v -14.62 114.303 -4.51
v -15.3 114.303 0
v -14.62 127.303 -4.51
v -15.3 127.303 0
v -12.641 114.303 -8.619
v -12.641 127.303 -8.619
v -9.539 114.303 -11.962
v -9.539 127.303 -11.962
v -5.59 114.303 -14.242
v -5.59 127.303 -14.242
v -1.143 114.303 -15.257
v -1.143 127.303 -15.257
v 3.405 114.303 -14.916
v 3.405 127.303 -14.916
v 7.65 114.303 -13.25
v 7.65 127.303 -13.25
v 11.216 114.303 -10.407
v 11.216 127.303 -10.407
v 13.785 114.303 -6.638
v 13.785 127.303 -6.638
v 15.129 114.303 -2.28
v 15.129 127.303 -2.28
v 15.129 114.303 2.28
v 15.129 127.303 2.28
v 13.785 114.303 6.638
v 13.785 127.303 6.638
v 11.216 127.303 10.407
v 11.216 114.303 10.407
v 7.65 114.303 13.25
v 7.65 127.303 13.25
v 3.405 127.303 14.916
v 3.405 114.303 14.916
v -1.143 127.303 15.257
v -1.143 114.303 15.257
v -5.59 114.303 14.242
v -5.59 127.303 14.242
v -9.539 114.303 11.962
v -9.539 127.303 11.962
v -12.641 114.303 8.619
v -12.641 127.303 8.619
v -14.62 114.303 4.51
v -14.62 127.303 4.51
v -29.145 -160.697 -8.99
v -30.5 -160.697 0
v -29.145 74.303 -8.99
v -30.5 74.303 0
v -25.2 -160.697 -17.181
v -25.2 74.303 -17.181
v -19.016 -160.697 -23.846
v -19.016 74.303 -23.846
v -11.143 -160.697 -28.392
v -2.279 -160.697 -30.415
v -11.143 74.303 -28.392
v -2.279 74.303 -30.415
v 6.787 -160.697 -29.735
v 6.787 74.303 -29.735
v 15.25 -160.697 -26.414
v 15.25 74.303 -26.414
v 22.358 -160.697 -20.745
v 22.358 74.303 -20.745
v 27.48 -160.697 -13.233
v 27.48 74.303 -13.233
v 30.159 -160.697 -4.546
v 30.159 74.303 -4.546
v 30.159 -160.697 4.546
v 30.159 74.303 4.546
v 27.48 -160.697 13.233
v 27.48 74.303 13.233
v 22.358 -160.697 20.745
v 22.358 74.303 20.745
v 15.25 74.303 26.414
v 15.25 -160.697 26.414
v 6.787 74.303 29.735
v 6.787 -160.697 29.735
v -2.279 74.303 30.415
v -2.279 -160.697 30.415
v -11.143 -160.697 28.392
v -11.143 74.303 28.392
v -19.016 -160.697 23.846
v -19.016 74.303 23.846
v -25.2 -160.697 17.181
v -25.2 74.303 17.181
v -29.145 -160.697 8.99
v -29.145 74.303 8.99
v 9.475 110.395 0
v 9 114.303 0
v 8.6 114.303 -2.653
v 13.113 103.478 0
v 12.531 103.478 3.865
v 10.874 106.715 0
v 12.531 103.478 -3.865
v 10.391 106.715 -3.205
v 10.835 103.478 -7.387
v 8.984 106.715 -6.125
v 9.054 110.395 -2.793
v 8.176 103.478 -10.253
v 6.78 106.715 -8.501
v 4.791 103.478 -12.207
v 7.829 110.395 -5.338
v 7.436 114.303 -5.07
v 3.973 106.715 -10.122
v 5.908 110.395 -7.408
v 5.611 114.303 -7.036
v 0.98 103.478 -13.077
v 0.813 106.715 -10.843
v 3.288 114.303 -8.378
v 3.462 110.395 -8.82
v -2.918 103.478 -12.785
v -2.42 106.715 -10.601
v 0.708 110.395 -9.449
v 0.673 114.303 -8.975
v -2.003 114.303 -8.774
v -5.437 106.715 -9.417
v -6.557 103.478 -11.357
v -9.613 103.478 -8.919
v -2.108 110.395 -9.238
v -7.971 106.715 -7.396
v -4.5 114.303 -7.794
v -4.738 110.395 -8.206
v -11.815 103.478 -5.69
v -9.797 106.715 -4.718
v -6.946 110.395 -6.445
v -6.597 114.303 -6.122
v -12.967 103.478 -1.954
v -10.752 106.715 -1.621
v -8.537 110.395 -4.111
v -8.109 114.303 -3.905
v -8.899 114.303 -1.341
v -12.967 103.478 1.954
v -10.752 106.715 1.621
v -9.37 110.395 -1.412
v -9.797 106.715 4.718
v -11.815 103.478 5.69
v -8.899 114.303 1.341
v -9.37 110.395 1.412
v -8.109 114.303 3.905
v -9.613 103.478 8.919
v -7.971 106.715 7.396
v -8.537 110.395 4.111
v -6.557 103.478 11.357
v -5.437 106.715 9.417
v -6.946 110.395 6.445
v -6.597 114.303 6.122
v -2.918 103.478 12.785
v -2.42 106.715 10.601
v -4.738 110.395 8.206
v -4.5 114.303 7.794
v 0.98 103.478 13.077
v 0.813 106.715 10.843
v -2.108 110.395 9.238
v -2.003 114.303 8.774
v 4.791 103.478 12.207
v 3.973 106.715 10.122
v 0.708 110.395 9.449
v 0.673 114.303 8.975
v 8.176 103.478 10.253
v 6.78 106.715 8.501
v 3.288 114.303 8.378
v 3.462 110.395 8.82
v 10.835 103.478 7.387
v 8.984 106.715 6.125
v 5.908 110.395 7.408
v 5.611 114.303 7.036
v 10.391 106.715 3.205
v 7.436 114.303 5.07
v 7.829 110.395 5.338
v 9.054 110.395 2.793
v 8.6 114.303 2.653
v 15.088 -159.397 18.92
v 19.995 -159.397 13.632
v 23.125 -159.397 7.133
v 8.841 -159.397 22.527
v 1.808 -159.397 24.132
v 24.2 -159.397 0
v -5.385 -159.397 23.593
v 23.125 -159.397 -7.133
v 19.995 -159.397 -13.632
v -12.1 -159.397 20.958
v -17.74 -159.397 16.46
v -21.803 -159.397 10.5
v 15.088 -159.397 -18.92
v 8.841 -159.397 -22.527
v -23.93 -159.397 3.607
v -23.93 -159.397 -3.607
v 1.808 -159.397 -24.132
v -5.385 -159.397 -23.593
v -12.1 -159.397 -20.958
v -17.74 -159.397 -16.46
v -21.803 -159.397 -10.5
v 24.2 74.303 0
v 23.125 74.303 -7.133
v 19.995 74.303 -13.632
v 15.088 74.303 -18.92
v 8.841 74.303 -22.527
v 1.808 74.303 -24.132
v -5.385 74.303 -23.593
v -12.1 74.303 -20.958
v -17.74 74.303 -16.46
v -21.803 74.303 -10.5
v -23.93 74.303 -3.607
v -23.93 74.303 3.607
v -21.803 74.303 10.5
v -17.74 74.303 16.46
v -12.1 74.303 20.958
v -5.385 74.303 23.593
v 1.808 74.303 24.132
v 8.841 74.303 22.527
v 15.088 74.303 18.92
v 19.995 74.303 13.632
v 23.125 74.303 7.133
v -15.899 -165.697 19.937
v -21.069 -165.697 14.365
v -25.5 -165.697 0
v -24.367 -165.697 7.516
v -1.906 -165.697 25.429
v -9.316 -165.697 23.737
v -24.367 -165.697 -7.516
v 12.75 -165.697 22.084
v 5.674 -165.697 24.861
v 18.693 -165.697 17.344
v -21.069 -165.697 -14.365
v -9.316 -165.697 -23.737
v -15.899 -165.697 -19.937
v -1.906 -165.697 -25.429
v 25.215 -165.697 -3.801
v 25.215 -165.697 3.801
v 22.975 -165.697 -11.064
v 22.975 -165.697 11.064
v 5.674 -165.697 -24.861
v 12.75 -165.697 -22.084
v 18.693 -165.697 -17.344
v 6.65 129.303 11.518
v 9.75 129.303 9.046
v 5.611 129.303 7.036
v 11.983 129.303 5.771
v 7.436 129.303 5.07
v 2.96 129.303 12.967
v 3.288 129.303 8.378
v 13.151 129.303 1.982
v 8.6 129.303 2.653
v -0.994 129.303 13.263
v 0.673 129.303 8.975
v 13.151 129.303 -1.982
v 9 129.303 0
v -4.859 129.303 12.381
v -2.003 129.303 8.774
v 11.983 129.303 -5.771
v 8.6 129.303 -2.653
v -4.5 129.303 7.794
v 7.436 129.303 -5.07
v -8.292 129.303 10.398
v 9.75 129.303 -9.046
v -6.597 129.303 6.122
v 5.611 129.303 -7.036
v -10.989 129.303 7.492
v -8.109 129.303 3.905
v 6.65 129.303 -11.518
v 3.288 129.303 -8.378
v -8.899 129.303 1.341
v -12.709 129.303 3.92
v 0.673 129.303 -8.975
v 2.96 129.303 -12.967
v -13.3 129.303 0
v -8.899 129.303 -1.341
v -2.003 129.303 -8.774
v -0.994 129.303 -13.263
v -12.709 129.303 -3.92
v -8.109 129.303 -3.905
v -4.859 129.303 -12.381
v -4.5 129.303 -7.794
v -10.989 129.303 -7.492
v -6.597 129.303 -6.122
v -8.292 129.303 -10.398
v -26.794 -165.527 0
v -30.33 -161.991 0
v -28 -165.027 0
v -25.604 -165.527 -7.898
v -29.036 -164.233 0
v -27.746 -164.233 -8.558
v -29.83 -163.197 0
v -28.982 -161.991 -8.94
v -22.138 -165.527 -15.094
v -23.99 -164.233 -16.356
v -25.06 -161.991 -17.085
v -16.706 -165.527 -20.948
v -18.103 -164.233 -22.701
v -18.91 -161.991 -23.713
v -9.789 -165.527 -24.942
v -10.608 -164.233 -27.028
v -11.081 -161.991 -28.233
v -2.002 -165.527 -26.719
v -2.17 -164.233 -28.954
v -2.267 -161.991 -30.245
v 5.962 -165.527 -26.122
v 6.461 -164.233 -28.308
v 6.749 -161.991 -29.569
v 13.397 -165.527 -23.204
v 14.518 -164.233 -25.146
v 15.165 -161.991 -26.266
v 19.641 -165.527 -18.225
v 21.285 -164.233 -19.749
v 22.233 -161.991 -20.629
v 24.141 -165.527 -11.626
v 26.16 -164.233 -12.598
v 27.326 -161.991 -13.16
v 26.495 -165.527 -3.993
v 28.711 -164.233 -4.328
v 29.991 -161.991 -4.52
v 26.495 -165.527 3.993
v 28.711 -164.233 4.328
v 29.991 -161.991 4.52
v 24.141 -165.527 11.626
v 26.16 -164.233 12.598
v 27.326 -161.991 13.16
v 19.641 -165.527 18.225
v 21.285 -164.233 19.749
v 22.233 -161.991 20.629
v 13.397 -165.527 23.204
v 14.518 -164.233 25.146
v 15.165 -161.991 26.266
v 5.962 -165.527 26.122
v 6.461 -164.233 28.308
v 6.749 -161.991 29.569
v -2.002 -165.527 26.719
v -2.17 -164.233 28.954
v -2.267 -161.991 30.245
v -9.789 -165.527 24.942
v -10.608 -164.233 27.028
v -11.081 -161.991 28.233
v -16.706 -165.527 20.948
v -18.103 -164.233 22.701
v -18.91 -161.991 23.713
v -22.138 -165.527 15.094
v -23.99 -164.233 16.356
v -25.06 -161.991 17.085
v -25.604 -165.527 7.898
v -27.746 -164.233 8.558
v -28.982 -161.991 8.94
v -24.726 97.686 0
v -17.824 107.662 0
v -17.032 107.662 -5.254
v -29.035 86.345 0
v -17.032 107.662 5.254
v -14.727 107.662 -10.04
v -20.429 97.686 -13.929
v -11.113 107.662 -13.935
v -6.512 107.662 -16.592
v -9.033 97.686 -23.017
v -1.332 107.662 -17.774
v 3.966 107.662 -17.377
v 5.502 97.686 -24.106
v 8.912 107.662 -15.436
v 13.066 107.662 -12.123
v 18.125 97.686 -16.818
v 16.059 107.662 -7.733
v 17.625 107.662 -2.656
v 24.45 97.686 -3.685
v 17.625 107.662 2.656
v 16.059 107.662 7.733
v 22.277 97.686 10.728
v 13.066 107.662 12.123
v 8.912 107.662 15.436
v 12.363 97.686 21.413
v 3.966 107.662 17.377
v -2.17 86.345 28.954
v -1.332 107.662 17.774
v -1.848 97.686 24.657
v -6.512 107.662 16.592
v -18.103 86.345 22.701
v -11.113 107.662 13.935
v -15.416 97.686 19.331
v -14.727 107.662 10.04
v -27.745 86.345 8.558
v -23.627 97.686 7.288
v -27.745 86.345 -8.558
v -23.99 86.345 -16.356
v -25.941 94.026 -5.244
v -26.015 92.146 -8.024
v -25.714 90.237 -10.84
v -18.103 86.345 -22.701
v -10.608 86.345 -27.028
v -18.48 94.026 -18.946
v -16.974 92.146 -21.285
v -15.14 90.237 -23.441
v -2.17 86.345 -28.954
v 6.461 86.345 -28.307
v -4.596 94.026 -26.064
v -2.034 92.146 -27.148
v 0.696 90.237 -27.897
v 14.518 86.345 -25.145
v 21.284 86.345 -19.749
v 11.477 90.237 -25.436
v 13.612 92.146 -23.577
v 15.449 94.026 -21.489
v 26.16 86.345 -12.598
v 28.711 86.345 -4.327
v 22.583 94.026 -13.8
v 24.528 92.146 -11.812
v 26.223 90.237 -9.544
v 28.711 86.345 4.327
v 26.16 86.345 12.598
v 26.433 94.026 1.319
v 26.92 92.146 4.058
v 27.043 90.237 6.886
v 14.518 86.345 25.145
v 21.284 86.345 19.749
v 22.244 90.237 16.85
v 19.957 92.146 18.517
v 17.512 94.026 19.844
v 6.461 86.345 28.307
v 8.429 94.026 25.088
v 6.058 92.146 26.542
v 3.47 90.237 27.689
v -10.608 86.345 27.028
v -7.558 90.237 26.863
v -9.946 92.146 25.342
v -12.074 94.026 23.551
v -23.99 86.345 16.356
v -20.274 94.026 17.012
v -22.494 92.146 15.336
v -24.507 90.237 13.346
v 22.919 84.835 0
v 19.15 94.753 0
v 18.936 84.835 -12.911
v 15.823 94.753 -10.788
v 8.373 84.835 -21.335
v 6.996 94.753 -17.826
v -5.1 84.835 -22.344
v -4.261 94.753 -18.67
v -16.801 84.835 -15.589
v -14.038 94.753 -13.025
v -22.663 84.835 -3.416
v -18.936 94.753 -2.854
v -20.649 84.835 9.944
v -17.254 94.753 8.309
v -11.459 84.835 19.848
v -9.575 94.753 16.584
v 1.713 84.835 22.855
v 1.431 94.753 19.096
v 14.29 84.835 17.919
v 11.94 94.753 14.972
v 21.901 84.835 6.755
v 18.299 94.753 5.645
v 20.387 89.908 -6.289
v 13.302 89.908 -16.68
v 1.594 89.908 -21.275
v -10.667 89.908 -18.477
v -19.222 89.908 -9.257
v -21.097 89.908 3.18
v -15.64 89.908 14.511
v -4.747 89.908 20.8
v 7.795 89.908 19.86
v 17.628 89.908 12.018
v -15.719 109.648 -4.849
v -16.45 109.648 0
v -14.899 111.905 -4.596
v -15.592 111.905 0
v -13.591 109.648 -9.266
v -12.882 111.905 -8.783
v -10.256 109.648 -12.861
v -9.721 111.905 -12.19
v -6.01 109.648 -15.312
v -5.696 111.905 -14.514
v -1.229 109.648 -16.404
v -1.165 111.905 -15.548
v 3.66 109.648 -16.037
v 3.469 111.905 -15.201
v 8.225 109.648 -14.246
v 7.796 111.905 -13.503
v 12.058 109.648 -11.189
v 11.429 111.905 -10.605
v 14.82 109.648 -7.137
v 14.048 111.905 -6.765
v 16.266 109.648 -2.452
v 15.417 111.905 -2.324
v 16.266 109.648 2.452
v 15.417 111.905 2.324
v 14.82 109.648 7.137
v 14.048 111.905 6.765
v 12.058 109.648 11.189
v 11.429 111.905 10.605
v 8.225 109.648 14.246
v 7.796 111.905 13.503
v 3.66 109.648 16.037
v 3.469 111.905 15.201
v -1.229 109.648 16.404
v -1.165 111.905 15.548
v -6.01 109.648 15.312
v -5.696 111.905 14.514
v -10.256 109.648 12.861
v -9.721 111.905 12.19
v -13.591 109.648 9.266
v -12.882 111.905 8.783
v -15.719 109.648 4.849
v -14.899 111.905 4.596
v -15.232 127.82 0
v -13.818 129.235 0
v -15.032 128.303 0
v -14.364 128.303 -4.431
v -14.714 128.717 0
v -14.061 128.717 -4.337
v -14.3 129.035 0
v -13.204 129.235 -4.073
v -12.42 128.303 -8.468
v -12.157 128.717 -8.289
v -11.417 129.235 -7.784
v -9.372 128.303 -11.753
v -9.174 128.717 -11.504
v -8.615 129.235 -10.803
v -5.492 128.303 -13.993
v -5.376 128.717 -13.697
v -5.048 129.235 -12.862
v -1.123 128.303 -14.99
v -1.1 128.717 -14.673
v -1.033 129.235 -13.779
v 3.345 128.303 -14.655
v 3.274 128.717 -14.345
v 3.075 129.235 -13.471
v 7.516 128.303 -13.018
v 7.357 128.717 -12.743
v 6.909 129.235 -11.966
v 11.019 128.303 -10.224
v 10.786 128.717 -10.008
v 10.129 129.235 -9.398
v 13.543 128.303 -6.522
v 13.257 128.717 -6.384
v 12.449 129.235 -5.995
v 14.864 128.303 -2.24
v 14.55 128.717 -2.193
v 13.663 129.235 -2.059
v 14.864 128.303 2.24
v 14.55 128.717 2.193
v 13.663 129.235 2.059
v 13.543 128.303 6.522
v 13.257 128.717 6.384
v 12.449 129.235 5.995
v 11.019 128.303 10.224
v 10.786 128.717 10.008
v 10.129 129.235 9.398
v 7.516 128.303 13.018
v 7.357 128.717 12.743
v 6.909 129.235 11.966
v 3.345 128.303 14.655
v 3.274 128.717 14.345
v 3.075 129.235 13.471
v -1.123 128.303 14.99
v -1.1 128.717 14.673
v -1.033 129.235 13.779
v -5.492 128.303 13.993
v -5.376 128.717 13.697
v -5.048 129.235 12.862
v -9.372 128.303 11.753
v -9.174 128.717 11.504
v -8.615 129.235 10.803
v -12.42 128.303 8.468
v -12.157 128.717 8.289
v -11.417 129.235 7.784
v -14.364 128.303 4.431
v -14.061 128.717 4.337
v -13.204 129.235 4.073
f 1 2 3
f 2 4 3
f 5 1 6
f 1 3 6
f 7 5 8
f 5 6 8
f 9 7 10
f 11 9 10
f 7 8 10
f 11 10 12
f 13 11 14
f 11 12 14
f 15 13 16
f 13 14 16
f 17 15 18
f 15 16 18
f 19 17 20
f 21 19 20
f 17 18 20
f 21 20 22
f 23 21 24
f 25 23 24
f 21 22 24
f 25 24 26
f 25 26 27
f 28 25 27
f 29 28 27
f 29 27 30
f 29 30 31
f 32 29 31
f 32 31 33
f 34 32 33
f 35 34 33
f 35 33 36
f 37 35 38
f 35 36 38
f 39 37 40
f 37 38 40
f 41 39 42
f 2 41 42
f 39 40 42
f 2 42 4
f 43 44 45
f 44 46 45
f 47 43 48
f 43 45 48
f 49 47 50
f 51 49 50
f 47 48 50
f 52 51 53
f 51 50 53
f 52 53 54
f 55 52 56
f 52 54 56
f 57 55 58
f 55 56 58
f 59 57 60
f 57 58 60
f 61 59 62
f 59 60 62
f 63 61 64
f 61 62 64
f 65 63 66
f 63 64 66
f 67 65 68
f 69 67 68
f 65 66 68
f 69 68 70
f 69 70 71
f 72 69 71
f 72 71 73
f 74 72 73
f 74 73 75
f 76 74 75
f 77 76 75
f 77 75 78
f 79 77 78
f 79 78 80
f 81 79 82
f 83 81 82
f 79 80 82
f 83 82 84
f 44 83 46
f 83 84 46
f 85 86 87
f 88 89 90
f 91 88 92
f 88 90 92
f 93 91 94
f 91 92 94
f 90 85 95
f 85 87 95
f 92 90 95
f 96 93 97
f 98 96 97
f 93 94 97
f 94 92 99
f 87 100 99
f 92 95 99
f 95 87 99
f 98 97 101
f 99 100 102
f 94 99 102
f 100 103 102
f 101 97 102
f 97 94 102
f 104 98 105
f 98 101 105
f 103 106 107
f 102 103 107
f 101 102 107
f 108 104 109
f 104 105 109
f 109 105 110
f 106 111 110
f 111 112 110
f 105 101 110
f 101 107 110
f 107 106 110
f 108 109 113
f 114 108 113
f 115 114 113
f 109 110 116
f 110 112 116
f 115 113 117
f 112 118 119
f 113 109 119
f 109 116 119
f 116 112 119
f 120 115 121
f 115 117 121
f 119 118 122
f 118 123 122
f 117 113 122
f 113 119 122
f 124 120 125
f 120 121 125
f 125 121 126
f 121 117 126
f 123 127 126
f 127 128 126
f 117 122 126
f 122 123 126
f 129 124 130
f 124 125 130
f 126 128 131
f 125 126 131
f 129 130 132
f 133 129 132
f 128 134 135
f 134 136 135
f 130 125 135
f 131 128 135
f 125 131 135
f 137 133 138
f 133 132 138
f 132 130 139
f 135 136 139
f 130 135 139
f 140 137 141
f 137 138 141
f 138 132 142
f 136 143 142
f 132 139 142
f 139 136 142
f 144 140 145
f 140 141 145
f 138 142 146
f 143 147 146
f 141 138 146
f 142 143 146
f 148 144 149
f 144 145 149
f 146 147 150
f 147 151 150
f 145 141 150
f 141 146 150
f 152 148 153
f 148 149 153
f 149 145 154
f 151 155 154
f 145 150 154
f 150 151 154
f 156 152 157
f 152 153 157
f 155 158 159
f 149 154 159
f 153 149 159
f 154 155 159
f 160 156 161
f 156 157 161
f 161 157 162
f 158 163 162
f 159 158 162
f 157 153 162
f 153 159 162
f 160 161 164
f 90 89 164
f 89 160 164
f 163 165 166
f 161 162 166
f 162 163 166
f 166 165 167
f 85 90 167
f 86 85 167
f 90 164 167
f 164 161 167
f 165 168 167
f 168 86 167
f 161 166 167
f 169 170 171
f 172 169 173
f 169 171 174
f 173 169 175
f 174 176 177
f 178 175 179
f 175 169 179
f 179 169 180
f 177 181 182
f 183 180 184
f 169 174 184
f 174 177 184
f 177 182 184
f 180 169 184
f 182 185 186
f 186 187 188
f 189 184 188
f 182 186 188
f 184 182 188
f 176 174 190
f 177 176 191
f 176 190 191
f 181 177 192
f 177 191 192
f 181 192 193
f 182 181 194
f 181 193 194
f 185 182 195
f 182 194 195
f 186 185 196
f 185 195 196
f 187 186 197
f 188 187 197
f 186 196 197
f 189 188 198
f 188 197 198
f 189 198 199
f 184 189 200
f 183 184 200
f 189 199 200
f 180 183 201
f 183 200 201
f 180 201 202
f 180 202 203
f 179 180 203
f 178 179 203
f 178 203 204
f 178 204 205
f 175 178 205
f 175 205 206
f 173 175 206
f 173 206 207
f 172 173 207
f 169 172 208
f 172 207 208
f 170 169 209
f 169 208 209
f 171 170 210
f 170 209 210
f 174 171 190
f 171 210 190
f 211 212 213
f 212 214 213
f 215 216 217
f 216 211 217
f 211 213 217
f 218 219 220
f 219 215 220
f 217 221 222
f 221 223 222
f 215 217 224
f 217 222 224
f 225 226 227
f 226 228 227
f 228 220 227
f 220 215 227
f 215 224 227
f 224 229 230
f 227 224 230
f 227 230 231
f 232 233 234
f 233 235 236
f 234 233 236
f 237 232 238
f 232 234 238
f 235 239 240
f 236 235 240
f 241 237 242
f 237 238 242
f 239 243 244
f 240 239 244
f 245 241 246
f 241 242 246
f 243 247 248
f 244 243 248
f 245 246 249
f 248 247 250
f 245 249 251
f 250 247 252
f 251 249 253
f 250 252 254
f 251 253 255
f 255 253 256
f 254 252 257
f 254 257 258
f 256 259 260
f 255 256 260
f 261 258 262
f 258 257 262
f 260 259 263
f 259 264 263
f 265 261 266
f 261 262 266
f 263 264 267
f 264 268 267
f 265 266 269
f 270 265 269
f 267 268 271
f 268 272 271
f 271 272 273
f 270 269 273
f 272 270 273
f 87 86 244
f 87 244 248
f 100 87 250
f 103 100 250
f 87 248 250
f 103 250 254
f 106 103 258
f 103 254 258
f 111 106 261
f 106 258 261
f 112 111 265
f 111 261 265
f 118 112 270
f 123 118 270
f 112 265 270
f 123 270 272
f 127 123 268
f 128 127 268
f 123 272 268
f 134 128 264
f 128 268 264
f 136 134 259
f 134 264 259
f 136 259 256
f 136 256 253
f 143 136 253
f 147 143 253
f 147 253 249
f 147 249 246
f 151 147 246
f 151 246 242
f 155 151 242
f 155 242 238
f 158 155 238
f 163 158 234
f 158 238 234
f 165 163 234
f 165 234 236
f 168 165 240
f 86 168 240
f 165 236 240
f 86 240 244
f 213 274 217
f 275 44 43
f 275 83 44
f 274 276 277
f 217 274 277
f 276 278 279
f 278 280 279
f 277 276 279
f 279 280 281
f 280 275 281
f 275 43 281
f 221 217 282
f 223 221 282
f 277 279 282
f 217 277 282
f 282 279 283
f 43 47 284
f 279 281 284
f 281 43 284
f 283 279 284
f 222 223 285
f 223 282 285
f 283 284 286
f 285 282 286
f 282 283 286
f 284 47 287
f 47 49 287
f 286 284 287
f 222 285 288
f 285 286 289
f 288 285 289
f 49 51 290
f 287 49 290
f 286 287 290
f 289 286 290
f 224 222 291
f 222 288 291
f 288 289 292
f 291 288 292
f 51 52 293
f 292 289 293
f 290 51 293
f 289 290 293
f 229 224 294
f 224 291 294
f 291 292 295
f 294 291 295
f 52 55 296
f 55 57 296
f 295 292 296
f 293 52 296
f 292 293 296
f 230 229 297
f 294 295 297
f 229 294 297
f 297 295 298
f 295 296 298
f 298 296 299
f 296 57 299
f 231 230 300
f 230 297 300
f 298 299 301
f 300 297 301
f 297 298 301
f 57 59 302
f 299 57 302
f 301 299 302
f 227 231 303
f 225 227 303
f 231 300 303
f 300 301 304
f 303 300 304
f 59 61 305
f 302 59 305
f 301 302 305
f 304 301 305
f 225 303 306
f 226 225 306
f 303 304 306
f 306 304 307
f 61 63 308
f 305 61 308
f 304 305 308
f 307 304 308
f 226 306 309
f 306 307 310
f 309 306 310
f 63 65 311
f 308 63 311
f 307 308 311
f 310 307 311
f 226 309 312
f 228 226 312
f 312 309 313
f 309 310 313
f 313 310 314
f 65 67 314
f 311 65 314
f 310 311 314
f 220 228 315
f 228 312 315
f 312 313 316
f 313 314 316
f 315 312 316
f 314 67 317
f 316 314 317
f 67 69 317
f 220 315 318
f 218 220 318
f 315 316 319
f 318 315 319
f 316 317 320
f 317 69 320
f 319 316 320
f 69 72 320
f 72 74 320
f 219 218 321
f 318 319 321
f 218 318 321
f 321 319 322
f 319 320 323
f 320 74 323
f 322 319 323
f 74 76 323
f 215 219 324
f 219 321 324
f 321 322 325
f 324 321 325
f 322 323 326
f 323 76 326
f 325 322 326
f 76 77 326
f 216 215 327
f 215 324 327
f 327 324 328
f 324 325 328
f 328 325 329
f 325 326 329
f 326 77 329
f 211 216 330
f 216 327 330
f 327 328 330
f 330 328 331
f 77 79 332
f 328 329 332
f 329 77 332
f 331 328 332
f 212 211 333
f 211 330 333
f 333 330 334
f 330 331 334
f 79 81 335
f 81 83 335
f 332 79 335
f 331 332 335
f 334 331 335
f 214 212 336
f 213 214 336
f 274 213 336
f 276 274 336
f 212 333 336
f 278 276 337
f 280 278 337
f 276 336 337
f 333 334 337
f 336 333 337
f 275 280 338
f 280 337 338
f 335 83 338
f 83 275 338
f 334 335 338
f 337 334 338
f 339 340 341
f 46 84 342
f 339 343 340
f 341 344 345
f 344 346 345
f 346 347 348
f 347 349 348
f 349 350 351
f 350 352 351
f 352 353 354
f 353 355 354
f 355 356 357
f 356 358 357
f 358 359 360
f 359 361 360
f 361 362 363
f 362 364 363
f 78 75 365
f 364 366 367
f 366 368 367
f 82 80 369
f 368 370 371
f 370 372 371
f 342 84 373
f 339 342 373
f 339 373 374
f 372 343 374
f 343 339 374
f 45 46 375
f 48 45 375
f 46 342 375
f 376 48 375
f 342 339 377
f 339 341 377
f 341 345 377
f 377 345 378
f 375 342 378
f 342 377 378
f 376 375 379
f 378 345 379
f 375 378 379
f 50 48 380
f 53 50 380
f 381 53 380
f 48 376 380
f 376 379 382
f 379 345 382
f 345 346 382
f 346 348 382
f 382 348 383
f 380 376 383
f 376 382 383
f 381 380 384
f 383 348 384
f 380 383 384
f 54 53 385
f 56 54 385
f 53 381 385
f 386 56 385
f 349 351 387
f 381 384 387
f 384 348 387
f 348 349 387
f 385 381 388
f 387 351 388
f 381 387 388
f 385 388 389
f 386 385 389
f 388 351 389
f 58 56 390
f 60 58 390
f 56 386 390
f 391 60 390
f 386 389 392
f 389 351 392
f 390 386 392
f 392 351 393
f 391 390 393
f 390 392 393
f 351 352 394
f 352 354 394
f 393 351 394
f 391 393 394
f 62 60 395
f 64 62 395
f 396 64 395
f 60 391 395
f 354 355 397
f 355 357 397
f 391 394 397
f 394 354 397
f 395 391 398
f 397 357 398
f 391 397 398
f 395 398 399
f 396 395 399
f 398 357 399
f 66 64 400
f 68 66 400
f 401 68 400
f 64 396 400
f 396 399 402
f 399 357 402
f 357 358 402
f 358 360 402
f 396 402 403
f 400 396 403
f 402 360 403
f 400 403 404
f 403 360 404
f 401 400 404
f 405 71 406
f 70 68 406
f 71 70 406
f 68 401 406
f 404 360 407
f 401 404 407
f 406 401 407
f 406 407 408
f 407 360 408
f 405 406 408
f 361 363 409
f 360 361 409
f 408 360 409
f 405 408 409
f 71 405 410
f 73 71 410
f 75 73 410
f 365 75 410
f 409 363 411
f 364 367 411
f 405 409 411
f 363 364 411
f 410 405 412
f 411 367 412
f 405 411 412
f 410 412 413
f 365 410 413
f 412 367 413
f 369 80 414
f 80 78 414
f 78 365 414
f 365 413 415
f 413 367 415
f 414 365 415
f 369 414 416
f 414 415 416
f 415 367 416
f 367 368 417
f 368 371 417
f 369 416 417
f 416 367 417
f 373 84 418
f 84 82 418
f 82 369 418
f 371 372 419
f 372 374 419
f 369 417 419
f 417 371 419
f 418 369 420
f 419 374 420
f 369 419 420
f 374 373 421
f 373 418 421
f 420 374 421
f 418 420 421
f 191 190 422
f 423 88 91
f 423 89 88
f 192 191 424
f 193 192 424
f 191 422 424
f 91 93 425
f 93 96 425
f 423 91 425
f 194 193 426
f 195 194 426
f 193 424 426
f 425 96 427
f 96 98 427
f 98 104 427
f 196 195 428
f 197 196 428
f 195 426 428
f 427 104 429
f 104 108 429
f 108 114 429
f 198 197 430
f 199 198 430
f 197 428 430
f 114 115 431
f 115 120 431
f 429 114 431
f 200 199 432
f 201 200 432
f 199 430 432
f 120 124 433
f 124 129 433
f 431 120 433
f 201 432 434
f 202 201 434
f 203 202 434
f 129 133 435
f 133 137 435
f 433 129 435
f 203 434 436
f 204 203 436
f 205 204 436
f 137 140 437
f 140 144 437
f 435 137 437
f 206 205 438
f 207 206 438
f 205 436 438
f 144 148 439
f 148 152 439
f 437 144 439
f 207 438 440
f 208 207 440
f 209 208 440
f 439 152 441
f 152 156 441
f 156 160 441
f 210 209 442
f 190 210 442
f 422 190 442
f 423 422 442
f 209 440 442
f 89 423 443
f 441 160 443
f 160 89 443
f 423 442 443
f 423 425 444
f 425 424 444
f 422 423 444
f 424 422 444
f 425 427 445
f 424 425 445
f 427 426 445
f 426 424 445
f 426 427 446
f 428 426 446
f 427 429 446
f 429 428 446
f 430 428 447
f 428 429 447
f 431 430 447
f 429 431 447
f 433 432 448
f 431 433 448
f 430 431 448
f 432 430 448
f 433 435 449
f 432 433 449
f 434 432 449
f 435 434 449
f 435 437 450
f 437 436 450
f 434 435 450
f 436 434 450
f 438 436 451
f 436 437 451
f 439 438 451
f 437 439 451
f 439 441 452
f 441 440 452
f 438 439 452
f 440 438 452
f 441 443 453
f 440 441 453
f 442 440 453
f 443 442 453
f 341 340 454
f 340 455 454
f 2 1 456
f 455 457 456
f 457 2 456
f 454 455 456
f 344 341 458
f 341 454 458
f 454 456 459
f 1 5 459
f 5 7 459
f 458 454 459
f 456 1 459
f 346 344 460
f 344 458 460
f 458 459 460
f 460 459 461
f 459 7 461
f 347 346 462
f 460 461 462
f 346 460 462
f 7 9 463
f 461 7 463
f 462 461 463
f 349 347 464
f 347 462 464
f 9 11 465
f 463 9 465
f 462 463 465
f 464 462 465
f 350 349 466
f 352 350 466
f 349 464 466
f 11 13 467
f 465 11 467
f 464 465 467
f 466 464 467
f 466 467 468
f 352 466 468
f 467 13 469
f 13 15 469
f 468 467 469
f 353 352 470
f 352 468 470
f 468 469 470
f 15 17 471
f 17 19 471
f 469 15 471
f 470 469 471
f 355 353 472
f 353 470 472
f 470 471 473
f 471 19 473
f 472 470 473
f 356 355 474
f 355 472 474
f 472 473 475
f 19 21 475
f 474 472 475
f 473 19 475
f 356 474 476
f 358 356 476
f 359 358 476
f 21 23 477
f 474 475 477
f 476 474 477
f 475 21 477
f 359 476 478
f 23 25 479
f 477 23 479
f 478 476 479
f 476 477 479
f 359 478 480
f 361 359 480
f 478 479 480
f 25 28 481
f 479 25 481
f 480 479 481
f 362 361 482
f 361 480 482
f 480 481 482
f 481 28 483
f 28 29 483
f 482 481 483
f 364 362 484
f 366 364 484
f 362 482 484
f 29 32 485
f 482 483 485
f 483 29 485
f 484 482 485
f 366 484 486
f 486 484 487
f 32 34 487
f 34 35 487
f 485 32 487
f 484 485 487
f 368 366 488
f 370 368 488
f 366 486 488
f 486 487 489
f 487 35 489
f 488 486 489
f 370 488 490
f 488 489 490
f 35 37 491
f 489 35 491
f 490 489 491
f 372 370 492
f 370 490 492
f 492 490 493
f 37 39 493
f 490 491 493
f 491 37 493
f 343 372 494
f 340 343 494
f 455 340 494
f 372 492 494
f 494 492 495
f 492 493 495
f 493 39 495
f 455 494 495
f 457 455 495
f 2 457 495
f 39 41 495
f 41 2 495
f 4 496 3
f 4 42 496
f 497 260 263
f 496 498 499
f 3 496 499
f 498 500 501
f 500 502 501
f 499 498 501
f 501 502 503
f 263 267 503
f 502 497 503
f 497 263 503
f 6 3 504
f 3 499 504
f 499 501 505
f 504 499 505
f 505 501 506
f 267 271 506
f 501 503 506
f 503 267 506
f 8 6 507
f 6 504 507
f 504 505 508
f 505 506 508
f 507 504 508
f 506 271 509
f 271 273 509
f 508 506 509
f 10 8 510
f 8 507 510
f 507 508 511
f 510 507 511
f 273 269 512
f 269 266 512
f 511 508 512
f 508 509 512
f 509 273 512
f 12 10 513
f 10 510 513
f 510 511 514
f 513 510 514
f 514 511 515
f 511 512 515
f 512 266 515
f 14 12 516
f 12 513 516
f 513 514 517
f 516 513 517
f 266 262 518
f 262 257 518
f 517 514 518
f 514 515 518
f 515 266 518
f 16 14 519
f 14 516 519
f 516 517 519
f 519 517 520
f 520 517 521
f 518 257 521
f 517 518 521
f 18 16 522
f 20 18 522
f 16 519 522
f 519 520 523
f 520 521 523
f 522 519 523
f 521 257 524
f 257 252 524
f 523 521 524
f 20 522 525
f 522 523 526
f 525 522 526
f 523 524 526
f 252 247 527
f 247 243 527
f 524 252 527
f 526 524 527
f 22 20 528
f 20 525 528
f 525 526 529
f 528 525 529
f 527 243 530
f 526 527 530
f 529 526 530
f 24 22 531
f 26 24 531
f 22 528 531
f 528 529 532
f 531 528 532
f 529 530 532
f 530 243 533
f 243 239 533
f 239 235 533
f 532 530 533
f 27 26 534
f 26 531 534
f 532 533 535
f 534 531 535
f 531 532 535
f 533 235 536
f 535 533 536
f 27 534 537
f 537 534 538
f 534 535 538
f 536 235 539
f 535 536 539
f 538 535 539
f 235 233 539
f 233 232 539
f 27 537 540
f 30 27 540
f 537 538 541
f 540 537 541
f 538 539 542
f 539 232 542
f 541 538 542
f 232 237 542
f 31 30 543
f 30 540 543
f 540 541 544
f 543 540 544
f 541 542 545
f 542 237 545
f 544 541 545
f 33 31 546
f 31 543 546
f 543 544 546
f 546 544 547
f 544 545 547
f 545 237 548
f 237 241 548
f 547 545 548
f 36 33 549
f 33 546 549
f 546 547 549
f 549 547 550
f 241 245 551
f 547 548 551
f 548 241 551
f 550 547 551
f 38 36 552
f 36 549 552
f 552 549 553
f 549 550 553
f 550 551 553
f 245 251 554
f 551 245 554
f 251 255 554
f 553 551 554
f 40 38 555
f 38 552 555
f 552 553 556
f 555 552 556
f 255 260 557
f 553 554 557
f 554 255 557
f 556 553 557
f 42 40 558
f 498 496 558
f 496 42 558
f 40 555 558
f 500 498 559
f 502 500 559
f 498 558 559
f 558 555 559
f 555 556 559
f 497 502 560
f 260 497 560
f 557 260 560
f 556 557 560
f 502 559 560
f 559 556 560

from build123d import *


# Read off the part's stored shape, not the designer's step: 抽壳1
with BuildPart() as part:
    # 草图1 → 旋转1 (revolve)
    with BuildSketch(Plane.XY, mode=Mode.PRIVATE) as revolve_1_sk:
        with BuildLine():
            Line((0, 129.302861252), (0, -165.697138748))
            Line((0, -165.697138748), (25.5, -165.697138748))
            ThreePointArc((25.5, -165.697138748), (29.035533906, -164.232672654), (30.5, -160.697138748))
            Line((30.5, -160.697138748), (30.5, 74.302861252))
            ThreePointArc((30.5, 74.302861252), (27.22407628, 92.146010239), (17.823593149, 107.661826649))
            ThreePointArc((17.823593149, 107.661826649), (15.952164194, 110.750683646), (15.3, 114.302861252))
            Line((15.3, 114.302861252), (15.3, 127.302861252))
            ThreePointArc((15.3, 127.302861252), (14.714213562, 128.717074815), (13.3, 129.302861252))
            Line((13.3, 129.302861252), (0, 129.302861252))
        make_face()
    revolve(revolve_1_sk.sketch.rotate(Axis((0, 129.302861252, 0), (0, -1, 0)), 180), axis=Axis((0, 129.302861252, 0), (0, -1, 0)))

    # 抽壳1 outline → 抽壳1 (revolve, cut)
    with BuildSketch(Plane.XY):
        with BuildLine():
            Line((0, -159.397138748), (24.2, -159.397138748))
            Line((24.2, -159.397138748), (24.2, 74.302861252))
            ThreePointArc((24.2, 74.302861252), (21.334939722, 89.908138347), (13.113456833, 103.477974849))
            ThreePointArc((13.113456833, 103.477974849), (10.063027636, 108.512811754), (9, 114.302861252))
            Line((9, 114.302861252), (9, 129.302861252))
            Line((9, 129.302861252), (0, 129.302861252))
            Line((0, 129.302861252), (0, -159.397138748))
        make_face()
    revolve(axis=Axis((0, 0, 0), (0, 1, 0)), mode=Mode.SUBTRACT)


solid = part.part
